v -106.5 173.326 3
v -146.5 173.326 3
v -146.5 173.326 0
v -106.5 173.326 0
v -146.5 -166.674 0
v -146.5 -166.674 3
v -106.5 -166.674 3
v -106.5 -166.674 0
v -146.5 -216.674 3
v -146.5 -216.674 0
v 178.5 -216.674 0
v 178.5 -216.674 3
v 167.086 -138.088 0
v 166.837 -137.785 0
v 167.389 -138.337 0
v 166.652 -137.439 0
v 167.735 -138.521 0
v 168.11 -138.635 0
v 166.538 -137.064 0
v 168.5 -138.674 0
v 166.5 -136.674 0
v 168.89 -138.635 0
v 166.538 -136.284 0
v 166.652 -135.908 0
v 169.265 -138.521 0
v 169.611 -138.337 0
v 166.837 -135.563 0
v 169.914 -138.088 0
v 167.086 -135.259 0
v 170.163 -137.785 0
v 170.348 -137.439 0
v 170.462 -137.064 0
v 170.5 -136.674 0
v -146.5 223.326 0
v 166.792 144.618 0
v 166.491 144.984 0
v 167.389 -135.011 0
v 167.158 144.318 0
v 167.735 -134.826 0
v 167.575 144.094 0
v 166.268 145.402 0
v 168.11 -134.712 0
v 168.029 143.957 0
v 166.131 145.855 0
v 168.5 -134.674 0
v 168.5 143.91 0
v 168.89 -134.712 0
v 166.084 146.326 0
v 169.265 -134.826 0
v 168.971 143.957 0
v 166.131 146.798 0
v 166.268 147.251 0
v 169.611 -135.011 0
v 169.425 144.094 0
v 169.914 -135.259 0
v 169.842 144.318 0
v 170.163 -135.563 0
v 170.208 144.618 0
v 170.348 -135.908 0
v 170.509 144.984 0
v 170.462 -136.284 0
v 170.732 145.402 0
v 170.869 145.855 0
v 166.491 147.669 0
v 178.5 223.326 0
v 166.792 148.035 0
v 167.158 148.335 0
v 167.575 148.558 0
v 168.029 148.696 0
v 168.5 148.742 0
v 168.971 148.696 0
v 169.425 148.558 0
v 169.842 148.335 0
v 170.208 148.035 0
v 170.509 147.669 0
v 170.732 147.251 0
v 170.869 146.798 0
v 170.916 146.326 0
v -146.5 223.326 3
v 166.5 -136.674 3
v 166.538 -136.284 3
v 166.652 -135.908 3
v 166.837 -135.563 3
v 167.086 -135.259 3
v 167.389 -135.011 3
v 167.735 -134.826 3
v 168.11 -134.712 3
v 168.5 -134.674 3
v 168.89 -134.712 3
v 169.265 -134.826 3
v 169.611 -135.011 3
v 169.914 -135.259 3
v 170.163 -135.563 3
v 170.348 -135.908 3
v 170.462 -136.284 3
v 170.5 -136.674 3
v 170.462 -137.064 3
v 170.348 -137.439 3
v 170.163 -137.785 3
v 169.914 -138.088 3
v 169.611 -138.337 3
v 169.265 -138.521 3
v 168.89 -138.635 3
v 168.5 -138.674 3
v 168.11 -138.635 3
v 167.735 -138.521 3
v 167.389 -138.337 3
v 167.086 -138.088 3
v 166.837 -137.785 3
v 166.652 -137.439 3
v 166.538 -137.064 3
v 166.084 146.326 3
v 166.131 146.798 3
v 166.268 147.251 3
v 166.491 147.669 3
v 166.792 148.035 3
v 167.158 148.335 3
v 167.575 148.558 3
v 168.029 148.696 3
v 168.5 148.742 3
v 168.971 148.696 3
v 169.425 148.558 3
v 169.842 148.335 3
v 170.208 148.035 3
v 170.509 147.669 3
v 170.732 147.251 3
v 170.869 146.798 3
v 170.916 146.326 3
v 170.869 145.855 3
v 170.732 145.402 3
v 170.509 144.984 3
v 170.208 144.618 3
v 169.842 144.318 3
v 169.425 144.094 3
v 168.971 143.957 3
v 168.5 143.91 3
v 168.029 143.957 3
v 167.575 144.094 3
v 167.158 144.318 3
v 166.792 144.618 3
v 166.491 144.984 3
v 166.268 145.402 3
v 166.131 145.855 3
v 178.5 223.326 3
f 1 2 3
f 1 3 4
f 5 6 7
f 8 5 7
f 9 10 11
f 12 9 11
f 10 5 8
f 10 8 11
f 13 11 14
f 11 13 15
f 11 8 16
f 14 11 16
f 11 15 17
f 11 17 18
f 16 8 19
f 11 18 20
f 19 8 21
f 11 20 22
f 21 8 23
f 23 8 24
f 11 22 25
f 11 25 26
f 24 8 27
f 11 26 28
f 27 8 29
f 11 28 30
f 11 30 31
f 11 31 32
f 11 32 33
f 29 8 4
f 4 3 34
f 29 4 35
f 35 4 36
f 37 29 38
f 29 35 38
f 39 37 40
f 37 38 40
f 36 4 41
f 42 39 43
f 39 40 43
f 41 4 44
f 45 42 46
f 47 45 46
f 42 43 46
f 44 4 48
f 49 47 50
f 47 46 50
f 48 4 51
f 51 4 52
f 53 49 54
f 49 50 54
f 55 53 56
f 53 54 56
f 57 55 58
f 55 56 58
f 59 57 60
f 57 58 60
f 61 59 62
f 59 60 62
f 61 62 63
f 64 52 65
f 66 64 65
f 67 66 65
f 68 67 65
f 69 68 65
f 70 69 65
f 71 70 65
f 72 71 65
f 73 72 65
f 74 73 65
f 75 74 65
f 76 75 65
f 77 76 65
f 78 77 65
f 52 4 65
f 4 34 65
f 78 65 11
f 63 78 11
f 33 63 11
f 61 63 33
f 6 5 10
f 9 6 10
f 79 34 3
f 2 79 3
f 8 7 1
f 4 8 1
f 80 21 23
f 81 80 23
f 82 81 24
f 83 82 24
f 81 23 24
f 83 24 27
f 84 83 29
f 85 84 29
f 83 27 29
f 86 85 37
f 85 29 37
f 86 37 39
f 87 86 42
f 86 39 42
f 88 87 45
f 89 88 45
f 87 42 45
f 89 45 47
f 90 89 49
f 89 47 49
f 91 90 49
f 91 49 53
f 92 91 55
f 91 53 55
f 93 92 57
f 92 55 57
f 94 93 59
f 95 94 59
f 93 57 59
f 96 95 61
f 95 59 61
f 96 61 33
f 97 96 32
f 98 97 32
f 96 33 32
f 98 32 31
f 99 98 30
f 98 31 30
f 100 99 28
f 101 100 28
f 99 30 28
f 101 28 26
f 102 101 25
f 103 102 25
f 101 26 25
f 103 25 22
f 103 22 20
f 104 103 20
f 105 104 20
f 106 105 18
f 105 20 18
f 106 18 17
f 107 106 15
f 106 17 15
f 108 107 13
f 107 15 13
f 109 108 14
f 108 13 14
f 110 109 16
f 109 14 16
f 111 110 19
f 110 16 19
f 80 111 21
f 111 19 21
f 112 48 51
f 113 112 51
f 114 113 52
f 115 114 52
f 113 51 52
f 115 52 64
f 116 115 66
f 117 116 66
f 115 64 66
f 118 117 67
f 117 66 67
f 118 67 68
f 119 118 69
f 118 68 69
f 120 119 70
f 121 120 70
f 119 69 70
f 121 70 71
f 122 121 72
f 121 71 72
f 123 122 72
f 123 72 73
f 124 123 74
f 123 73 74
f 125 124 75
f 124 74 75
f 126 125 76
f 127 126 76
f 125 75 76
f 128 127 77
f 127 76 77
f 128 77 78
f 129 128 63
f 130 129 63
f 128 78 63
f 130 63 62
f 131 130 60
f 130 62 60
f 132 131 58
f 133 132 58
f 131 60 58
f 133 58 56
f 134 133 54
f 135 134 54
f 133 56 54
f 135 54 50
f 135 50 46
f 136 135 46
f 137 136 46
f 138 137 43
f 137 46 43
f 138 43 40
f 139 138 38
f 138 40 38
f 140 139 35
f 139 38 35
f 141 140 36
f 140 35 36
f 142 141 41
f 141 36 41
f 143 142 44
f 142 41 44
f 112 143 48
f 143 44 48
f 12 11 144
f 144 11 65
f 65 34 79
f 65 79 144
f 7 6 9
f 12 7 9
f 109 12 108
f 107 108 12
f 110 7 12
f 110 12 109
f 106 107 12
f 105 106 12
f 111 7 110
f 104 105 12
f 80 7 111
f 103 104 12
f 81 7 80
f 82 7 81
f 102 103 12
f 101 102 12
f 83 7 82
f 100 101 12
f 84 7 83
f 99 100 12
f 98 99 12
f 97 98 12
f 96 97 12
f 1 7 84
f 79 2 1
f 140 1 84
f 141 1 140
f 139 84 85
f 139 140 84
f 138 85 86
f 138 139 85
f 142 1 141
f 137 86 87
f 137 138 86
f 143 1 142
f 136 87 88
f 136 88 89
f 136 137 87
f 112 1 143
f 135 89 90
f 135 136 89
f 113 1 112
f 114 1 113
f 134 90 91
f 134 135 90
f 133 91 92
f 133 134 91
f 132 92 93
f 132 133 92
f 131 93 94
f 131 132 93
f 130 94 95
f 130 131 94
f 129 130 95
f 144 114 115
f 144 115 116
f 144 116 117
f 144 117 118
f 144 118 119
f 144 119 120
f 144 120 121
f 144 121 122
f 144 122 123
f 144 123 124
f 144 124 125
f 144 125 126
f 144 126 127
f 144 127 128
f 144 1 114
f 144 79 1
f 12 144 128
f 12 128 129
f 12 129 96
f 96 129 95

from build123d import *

# Parameters (mm, degrees)
SKETCH1_W           = 325
SKETCH1_H           = 70
SKETCH1_H_2         = 300
BOSS_EXTRUDE1_DEPTH = 3
SKETCH2_W           = 40
SKETCH2_H           = 340
CUT_EXTRUDE1_DEPTH  = 3
SKETCH3_R           = 2
SKETCH3_R_2         = 2.415919743
CUT_EXTRUDE2_DEPTH  = 3


with BuildPart() as part:
    # Sketch1 → Boss-Extrude1 (new body)
    with BuildSketch(Plane.XY):
        with Locations((16, 188.326300096)):
            Rectangle(SKETCH1_W, SKETCH1_H)
        with Locations((16, 3.326300096)):
            Rectangle(SKETCH1_W, SKETCH1_H_2)
        with Locations((16, -181.673699904)):
            Rectangle(SKETCH1_W, SKETCH1_H)
    extrude(amount=BOSS_EXTRUDE1_DEPTH)

    # Sketch2 → Cut-Extrude1 (cut)
    with BuildSketch(Plane.XY.offset(3)):
        with Locations((-126.5, 3.326300096)):
            Rectangle(SKETCH2_W, SKETCH2_H)
    extrude(amount=-CUT_EXTRUDE1_DEPTH, mode=Mode.SUBTRACT)

    # Sketch3 → Cut-Extrude2 (cut)
    with BuildSketch(Plane(origin=(0, 0, 0), x_dir=(-1, 0, 0), z_dir=(0, 0, -1))):
        with Locations((-168.5, -136.673699904)):
            Circle(SKETCH3_R)
        with Locations((-168.5, 146.326300096)):
            Circle(SKETCH3_R_2)
    extrude(amount=-CUT_EXTRUDE2_DEPTH, mode=Mode.SUBTRACT)


solid = part.part
